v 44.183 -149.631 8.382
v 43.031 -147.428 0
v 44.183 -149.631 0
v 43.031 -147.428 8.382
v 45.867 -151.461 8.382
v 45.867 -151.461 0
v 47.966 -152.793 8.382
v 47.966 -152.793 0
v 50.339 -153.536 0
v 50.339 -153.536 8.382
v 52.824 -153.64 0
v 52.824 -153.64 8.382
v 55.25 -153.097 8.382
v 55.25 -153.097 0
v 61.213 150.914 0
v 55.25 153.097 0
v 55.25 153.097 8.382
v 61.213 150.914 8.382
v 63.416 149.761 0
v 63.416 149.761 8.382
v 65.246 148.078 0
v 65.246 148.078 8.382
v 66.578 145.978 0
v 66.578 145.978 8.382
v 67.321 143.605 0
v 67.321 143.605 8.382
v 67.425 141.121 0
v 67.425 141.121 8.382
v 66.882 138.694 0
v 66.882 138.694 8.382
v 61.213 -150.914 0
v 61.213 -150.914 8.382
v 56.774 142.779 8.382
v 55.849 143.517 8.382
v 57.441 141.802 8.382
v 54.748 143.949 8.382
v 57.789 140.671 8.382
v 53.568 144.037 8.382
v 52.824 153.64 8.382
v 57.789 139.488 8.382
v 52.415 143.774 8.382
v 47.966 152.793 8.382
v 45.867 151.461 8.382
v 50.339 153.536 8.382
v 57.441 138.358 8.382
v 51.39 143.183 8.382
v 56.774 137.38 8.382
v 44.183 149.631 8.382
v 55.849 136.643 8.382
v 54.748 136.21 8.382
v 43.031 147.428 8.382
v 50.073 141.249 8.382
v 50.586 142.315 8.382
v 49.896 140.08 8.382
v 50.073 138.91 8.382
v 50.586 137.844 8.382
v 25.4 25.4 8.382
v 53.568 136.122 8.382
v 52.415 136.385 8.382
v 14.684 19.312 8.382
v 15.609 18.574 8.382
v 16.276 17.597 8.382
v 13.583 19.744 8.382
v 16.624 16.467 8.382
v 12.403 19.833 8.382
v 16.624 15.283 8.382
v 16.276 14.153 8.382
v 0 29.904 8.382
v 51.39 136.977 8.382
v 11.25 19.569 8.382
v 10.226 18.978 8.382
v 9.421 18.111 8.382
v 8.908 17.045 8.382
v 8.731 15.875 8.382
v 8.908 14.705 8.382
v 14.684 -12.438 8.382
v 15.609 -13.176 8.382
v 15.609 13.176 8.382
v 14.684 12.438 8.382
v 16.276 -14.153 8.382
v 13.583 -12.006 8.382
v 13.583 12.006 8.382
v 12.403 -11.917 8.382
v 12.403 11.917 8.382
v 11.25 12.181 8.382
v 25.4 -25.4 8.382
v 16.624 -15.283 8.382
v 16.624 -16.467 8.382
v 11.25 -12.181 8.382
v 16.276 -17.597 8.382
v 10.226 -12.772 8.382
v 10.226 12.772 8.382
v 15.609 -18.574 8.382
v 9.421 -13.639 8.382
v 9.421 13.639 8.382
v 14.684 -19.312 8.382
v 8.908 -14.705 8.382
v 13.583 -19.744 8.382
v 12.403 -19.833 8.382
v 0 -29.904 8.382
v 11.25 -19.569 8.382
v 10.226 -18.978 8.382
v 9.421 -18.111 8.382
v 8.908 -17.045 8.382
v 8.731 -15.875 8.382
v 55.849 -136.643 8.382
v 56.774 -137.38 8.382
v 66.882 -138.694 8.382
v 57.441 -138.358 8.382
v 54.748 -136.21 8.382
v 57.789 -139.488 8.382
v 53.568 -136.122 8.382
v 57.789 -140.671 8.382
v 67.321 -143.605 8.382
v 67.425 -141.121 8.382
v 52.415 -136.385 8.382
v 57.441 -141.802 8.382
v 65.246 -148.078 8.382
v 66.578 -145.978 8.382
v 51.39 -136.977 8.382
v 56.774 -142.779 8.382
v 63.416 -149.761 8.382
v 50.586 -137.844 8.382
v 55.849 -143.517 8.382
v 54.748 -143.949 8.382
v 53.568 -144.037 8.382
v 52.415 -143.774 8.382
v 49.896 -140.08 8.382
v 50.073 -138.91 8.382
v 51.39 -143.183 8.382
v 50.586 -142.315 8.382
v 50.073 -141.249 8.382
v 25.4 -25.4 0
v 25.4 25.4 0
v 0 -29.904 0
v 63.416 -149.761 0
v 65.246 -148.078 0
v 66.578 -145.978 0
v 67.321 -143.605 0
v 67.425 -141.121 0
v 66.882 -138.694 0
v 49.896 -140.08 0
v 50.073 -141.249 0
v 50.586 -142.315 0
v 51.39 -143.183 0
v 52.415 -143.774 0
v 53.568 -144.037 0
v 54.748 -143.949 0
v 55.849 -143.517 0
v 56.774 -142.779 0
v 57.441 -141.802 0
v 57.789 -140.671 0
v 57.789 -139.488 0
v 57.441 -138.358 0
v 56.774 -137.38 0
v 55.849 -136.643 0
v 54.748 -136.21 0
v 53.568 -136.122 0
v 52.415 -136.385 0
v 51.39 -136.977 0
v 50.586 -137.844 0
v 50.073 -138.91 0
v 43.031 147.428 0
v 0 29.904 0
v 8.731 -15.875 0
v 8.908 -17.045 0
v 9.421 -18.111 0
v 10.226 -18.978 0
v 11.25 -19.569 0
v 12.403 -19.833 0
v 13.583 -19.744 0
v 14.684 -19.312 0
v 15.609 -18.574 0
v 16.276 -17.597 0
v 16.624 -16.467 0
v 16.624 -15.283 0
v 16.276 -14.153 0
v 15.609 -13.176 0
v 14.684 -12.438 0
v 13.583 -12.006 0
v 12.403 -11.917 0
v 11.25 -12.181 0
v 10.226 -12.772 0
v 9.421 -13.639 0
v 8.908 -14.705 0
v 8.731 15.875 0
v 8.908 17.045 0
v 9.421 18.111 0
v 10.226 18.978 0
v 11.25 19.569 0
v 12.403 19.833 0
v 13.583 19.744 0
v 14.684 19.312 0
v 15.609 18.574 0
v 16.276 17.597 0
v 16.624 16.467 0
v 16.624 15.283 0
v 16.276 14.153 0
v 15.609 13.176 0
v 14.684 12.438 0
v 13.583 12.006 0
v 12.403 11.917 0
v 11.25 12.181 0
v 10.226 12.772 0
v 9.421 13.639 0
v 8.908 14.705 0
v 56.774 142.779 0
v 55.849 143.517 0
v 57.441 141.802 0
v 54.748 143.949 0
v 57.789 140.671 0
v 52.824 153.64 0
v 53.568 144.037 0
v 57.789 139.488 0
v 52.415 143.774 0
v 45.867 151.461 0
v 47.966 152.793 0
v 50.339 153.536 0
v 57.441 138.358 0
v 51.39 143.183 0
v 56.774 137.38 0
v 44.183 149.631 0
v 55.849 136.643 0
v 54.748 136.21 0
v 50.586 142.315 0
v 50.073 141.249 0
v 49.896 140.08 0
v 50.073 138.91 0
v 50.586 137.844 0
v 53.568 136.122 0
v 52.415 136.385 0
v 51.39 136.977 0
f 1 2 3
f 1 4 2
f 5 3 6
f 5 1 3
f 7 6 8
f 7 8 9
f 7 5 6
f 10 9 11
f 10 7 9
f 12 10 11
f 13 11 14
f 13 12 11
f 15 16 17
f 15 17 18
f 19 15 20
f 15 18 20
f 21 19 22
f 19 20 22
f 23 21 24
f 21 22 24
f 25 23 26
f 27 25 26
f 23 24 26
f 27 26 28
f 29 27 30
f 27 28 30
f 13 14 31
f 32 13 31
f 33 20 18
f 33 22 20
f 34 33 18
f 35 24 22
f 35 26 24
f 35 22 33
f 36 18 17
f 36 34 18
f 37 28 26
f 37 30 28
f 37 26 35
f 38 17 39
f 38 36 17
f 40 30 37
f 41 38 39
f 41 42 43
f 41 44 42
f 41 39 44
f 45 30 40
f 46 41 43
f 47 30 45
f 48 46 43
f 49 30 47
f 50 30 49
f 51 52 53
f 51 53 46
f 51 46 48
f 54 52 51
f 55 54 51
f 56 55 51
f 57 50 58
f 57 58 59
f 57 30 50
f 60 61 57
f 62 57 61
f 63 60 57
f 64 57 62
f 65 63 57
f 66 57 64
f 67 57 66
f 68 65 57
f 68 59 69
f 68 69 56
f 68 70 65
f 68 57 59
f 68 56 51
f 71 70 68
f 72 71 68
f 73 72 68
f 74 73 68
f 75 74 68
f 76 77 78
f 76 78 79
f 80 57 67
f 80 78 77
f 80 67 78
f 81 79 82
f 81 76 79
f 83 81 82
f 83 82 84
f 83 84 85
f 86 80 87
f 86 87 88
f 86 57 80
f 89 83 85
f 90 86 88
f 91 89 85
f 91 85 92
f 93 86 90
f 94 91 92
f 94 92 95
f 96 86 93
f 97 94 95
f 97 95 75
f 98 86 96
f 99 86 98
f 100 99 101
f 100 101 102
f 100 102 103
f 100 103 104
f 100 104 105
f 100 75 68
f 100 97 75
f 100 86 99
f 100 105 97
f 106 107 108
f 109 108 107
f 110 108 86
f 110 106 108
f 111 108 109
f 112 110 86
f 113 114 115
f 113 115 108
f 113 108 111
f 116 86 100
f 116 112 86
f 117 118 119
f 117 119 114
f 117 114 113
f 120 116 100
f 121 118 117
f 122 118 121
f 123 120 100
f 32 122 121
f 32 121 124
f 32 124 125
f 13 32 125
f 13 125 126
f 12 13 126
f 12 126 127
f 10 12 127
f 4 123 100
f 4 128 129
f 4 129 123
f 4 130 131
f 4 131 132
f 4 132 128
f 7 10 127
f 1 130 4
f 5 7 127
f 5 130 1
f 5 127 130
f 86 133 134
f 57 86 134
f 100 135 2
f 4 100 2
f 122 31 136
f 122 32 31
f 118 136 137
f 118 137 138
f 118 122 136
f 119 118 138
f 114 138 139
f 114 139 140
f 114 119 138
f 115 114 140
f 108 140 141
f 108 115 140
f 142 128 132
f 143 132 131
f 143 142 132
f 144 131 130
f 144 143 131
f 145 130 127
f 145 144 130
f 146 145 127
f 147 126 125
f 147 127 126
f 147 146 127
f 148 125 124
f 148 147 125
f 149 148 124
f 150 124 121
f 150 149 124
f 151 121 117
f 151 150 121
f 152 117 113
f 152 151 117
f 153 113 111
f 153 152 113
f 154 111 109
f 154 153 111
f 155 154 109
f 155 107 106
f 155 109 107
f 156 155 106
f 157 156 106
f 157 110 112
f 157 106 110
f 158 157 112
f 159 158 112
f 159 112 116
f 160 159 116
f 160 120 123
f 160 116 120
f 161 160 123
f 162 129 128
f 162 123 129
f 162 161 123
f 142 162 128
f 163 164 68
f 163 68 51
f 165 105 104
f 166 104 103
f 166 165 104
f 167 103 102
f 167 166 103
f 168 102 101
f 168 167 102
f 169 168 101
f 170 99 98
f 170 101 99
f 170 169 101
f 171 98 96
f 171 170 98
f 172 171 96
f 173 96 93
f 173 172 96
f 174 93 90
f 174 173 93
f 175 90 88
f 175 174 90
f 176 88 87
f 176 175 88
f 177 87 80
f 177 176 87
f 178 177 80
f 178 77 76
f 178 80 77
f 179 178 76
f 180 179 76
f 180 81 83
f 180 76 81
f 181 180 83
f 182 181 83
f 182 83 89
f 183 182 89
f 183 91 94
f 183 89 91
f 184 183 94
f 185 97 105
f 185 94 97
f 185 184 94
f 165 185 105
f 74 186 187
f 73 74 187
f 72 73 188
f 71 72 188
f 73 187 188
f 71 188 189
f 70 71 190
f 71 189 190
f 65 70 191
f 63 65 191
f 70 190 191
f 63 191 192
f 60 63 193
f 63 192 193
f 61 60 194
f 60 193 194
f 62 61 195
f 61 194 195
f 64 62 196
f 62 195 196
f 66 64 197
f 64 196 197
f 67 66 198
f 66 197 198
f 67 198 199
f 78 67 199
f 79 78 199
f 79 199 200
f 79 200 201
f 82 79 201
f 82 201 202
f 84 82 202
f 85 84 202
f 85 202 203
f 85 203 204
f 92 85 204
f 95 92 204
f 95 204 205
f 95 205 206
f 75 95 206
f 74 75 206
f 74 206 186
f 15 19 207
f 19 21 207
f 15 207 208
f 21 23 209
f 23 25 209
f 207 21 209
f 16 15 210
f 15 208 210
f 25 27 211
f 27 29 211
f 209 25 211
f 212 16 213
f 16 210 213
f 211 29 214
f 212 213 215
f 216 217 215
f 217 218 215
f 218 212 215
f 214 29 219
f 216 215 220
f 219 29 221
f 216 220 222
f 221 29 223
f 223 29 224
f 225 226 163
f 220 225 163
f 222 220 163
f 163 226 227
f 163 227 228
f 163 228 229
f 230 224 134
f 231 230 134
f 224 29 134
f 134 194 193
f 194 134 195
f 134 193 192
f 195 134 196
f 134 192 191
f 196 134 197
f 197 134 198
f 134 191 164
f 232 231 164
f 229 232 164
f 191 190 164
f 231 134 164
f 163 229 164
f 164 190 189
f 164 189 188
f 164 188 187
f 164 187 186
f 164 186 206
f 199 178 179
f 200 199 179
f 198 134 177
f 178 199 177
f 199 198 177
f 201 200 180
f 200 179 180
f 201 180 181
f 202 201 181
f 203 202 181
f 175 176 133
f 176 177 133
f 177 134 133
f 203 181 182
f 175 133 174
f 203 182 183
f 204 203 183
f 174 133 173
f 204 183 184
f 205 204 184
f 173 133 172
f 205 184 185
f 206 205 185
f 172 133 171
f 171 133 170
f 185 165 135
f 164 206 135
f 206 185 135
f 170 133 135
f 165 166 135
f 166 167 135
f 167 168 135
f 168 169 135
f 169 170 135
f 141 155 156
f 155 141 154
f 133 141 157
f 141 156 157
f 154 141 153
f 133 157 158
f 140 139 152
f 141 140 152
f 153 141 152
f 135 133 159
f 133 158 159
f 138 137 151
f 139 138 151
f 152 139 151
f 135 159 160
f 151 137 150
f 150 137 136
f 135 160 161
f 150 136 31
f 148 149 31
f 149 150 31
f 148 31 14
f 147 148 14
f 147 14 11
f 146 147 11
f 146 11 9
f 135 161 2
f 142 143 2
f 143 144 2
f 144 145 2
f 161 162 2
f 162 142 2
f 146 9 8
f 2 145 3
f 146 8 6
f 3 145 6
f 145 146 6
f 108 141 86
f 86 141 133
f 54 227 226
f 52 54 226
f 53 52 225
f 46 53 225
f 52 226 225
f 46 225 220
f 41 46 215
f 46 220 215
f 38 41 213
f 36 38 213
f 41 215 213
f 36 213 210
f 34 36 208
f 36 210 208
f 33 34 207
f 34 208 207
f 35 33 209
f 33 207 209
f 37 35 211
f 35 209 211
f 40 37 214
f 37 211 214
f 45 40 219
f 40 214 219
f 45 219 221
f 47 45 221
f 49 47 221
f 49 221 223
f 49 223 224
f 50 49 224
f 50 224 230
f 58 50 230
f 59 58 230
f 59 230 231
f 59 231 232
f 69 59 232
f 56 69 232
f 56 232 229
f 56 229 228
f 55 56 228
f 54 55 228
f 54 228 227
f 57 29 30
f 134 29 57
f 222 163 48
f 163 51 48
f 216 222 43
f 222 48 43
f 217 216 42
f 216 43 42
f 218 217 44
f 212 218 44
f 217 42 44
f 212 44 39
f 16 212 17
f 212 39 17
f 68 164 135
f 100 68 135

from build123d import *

# Parameters (mm, degrees)
EXTRUDE1_DEPTH       = 8.382
SKETCH2_R            = 3.96875
CUT_EXTRUDE1_DEPTH   = 172.593904288
FILLET4_R            = 9.525
FILLET4_OF_MIRROR1_R = 9.525


with BuildPart() as part:
    # Sketch1 → Extrude1 (new body)
    with BuildSketch(Plane.XY):
        Polygon((0, 0), (0, 29.903849897), (46.305765967, 156.371903759), (70.157236117, 147.638784517), (25.4, 25.4), (25.4, 0), align=None)
    extrude1 = extrude(amount=EXTRUDE1_DEPTH)

    # Sketch2 → Cut-Extrude1 (cut, through all)
    with BuildSketch(Plane(origin=(0, 0, 0), x_dir=(-1, 0, 0), z_dir=(0, 0, -1))):
        with Locations((-53.864941421, 140.079609063)):
            Circle(SKETCH2_R)
        with Locations((-12.7, 15.875)):
            Circle(SKETCH2_R)
    cut_extrude1 = extrude(amount=-CUT_EXTRUDE1_DEPTH, mode=Mode.SUBTRACT)

    # Fillet4
    fillet4_edges = [part.edges().sort_by_distance(p)[0] for p in [
        (46.305765967, 156.371903759, 4.191),
        (70.157236117, 147.638784517, 4.191),
    ]]
    fillet(fillet4_edges, radius=FILLET4_R)

    # Mirror1: Extrude1, Cut-Extrude1 across plane
    add(extrude1.mirror(Plane(origin=(25.4, 0, 8.382), x_dir=(0, 0, 1), z_dir=(0, 1, 0))))
    add(cut_extrude1.mirror(Plane(origin=(25.4, 0, 8.382), x_dir=(0, 0, 1), z_dir=(0, 1, 0))), mode=Mode.SUBTRACT)

    # Fillet4 of Mirror1
    fillet4_of_mirror1_edges = [part.edges().sort_by_distance(p)[0] for p in [
        (46.305765967, -156.371903759, 4.191),
        (70.157236117, -147.638784517, 4.191),
    ]]
    fillet(fillet4_of_mirror1_edges, radius=FILLET4_OF_MIRROR1_R)


solid = part.part
